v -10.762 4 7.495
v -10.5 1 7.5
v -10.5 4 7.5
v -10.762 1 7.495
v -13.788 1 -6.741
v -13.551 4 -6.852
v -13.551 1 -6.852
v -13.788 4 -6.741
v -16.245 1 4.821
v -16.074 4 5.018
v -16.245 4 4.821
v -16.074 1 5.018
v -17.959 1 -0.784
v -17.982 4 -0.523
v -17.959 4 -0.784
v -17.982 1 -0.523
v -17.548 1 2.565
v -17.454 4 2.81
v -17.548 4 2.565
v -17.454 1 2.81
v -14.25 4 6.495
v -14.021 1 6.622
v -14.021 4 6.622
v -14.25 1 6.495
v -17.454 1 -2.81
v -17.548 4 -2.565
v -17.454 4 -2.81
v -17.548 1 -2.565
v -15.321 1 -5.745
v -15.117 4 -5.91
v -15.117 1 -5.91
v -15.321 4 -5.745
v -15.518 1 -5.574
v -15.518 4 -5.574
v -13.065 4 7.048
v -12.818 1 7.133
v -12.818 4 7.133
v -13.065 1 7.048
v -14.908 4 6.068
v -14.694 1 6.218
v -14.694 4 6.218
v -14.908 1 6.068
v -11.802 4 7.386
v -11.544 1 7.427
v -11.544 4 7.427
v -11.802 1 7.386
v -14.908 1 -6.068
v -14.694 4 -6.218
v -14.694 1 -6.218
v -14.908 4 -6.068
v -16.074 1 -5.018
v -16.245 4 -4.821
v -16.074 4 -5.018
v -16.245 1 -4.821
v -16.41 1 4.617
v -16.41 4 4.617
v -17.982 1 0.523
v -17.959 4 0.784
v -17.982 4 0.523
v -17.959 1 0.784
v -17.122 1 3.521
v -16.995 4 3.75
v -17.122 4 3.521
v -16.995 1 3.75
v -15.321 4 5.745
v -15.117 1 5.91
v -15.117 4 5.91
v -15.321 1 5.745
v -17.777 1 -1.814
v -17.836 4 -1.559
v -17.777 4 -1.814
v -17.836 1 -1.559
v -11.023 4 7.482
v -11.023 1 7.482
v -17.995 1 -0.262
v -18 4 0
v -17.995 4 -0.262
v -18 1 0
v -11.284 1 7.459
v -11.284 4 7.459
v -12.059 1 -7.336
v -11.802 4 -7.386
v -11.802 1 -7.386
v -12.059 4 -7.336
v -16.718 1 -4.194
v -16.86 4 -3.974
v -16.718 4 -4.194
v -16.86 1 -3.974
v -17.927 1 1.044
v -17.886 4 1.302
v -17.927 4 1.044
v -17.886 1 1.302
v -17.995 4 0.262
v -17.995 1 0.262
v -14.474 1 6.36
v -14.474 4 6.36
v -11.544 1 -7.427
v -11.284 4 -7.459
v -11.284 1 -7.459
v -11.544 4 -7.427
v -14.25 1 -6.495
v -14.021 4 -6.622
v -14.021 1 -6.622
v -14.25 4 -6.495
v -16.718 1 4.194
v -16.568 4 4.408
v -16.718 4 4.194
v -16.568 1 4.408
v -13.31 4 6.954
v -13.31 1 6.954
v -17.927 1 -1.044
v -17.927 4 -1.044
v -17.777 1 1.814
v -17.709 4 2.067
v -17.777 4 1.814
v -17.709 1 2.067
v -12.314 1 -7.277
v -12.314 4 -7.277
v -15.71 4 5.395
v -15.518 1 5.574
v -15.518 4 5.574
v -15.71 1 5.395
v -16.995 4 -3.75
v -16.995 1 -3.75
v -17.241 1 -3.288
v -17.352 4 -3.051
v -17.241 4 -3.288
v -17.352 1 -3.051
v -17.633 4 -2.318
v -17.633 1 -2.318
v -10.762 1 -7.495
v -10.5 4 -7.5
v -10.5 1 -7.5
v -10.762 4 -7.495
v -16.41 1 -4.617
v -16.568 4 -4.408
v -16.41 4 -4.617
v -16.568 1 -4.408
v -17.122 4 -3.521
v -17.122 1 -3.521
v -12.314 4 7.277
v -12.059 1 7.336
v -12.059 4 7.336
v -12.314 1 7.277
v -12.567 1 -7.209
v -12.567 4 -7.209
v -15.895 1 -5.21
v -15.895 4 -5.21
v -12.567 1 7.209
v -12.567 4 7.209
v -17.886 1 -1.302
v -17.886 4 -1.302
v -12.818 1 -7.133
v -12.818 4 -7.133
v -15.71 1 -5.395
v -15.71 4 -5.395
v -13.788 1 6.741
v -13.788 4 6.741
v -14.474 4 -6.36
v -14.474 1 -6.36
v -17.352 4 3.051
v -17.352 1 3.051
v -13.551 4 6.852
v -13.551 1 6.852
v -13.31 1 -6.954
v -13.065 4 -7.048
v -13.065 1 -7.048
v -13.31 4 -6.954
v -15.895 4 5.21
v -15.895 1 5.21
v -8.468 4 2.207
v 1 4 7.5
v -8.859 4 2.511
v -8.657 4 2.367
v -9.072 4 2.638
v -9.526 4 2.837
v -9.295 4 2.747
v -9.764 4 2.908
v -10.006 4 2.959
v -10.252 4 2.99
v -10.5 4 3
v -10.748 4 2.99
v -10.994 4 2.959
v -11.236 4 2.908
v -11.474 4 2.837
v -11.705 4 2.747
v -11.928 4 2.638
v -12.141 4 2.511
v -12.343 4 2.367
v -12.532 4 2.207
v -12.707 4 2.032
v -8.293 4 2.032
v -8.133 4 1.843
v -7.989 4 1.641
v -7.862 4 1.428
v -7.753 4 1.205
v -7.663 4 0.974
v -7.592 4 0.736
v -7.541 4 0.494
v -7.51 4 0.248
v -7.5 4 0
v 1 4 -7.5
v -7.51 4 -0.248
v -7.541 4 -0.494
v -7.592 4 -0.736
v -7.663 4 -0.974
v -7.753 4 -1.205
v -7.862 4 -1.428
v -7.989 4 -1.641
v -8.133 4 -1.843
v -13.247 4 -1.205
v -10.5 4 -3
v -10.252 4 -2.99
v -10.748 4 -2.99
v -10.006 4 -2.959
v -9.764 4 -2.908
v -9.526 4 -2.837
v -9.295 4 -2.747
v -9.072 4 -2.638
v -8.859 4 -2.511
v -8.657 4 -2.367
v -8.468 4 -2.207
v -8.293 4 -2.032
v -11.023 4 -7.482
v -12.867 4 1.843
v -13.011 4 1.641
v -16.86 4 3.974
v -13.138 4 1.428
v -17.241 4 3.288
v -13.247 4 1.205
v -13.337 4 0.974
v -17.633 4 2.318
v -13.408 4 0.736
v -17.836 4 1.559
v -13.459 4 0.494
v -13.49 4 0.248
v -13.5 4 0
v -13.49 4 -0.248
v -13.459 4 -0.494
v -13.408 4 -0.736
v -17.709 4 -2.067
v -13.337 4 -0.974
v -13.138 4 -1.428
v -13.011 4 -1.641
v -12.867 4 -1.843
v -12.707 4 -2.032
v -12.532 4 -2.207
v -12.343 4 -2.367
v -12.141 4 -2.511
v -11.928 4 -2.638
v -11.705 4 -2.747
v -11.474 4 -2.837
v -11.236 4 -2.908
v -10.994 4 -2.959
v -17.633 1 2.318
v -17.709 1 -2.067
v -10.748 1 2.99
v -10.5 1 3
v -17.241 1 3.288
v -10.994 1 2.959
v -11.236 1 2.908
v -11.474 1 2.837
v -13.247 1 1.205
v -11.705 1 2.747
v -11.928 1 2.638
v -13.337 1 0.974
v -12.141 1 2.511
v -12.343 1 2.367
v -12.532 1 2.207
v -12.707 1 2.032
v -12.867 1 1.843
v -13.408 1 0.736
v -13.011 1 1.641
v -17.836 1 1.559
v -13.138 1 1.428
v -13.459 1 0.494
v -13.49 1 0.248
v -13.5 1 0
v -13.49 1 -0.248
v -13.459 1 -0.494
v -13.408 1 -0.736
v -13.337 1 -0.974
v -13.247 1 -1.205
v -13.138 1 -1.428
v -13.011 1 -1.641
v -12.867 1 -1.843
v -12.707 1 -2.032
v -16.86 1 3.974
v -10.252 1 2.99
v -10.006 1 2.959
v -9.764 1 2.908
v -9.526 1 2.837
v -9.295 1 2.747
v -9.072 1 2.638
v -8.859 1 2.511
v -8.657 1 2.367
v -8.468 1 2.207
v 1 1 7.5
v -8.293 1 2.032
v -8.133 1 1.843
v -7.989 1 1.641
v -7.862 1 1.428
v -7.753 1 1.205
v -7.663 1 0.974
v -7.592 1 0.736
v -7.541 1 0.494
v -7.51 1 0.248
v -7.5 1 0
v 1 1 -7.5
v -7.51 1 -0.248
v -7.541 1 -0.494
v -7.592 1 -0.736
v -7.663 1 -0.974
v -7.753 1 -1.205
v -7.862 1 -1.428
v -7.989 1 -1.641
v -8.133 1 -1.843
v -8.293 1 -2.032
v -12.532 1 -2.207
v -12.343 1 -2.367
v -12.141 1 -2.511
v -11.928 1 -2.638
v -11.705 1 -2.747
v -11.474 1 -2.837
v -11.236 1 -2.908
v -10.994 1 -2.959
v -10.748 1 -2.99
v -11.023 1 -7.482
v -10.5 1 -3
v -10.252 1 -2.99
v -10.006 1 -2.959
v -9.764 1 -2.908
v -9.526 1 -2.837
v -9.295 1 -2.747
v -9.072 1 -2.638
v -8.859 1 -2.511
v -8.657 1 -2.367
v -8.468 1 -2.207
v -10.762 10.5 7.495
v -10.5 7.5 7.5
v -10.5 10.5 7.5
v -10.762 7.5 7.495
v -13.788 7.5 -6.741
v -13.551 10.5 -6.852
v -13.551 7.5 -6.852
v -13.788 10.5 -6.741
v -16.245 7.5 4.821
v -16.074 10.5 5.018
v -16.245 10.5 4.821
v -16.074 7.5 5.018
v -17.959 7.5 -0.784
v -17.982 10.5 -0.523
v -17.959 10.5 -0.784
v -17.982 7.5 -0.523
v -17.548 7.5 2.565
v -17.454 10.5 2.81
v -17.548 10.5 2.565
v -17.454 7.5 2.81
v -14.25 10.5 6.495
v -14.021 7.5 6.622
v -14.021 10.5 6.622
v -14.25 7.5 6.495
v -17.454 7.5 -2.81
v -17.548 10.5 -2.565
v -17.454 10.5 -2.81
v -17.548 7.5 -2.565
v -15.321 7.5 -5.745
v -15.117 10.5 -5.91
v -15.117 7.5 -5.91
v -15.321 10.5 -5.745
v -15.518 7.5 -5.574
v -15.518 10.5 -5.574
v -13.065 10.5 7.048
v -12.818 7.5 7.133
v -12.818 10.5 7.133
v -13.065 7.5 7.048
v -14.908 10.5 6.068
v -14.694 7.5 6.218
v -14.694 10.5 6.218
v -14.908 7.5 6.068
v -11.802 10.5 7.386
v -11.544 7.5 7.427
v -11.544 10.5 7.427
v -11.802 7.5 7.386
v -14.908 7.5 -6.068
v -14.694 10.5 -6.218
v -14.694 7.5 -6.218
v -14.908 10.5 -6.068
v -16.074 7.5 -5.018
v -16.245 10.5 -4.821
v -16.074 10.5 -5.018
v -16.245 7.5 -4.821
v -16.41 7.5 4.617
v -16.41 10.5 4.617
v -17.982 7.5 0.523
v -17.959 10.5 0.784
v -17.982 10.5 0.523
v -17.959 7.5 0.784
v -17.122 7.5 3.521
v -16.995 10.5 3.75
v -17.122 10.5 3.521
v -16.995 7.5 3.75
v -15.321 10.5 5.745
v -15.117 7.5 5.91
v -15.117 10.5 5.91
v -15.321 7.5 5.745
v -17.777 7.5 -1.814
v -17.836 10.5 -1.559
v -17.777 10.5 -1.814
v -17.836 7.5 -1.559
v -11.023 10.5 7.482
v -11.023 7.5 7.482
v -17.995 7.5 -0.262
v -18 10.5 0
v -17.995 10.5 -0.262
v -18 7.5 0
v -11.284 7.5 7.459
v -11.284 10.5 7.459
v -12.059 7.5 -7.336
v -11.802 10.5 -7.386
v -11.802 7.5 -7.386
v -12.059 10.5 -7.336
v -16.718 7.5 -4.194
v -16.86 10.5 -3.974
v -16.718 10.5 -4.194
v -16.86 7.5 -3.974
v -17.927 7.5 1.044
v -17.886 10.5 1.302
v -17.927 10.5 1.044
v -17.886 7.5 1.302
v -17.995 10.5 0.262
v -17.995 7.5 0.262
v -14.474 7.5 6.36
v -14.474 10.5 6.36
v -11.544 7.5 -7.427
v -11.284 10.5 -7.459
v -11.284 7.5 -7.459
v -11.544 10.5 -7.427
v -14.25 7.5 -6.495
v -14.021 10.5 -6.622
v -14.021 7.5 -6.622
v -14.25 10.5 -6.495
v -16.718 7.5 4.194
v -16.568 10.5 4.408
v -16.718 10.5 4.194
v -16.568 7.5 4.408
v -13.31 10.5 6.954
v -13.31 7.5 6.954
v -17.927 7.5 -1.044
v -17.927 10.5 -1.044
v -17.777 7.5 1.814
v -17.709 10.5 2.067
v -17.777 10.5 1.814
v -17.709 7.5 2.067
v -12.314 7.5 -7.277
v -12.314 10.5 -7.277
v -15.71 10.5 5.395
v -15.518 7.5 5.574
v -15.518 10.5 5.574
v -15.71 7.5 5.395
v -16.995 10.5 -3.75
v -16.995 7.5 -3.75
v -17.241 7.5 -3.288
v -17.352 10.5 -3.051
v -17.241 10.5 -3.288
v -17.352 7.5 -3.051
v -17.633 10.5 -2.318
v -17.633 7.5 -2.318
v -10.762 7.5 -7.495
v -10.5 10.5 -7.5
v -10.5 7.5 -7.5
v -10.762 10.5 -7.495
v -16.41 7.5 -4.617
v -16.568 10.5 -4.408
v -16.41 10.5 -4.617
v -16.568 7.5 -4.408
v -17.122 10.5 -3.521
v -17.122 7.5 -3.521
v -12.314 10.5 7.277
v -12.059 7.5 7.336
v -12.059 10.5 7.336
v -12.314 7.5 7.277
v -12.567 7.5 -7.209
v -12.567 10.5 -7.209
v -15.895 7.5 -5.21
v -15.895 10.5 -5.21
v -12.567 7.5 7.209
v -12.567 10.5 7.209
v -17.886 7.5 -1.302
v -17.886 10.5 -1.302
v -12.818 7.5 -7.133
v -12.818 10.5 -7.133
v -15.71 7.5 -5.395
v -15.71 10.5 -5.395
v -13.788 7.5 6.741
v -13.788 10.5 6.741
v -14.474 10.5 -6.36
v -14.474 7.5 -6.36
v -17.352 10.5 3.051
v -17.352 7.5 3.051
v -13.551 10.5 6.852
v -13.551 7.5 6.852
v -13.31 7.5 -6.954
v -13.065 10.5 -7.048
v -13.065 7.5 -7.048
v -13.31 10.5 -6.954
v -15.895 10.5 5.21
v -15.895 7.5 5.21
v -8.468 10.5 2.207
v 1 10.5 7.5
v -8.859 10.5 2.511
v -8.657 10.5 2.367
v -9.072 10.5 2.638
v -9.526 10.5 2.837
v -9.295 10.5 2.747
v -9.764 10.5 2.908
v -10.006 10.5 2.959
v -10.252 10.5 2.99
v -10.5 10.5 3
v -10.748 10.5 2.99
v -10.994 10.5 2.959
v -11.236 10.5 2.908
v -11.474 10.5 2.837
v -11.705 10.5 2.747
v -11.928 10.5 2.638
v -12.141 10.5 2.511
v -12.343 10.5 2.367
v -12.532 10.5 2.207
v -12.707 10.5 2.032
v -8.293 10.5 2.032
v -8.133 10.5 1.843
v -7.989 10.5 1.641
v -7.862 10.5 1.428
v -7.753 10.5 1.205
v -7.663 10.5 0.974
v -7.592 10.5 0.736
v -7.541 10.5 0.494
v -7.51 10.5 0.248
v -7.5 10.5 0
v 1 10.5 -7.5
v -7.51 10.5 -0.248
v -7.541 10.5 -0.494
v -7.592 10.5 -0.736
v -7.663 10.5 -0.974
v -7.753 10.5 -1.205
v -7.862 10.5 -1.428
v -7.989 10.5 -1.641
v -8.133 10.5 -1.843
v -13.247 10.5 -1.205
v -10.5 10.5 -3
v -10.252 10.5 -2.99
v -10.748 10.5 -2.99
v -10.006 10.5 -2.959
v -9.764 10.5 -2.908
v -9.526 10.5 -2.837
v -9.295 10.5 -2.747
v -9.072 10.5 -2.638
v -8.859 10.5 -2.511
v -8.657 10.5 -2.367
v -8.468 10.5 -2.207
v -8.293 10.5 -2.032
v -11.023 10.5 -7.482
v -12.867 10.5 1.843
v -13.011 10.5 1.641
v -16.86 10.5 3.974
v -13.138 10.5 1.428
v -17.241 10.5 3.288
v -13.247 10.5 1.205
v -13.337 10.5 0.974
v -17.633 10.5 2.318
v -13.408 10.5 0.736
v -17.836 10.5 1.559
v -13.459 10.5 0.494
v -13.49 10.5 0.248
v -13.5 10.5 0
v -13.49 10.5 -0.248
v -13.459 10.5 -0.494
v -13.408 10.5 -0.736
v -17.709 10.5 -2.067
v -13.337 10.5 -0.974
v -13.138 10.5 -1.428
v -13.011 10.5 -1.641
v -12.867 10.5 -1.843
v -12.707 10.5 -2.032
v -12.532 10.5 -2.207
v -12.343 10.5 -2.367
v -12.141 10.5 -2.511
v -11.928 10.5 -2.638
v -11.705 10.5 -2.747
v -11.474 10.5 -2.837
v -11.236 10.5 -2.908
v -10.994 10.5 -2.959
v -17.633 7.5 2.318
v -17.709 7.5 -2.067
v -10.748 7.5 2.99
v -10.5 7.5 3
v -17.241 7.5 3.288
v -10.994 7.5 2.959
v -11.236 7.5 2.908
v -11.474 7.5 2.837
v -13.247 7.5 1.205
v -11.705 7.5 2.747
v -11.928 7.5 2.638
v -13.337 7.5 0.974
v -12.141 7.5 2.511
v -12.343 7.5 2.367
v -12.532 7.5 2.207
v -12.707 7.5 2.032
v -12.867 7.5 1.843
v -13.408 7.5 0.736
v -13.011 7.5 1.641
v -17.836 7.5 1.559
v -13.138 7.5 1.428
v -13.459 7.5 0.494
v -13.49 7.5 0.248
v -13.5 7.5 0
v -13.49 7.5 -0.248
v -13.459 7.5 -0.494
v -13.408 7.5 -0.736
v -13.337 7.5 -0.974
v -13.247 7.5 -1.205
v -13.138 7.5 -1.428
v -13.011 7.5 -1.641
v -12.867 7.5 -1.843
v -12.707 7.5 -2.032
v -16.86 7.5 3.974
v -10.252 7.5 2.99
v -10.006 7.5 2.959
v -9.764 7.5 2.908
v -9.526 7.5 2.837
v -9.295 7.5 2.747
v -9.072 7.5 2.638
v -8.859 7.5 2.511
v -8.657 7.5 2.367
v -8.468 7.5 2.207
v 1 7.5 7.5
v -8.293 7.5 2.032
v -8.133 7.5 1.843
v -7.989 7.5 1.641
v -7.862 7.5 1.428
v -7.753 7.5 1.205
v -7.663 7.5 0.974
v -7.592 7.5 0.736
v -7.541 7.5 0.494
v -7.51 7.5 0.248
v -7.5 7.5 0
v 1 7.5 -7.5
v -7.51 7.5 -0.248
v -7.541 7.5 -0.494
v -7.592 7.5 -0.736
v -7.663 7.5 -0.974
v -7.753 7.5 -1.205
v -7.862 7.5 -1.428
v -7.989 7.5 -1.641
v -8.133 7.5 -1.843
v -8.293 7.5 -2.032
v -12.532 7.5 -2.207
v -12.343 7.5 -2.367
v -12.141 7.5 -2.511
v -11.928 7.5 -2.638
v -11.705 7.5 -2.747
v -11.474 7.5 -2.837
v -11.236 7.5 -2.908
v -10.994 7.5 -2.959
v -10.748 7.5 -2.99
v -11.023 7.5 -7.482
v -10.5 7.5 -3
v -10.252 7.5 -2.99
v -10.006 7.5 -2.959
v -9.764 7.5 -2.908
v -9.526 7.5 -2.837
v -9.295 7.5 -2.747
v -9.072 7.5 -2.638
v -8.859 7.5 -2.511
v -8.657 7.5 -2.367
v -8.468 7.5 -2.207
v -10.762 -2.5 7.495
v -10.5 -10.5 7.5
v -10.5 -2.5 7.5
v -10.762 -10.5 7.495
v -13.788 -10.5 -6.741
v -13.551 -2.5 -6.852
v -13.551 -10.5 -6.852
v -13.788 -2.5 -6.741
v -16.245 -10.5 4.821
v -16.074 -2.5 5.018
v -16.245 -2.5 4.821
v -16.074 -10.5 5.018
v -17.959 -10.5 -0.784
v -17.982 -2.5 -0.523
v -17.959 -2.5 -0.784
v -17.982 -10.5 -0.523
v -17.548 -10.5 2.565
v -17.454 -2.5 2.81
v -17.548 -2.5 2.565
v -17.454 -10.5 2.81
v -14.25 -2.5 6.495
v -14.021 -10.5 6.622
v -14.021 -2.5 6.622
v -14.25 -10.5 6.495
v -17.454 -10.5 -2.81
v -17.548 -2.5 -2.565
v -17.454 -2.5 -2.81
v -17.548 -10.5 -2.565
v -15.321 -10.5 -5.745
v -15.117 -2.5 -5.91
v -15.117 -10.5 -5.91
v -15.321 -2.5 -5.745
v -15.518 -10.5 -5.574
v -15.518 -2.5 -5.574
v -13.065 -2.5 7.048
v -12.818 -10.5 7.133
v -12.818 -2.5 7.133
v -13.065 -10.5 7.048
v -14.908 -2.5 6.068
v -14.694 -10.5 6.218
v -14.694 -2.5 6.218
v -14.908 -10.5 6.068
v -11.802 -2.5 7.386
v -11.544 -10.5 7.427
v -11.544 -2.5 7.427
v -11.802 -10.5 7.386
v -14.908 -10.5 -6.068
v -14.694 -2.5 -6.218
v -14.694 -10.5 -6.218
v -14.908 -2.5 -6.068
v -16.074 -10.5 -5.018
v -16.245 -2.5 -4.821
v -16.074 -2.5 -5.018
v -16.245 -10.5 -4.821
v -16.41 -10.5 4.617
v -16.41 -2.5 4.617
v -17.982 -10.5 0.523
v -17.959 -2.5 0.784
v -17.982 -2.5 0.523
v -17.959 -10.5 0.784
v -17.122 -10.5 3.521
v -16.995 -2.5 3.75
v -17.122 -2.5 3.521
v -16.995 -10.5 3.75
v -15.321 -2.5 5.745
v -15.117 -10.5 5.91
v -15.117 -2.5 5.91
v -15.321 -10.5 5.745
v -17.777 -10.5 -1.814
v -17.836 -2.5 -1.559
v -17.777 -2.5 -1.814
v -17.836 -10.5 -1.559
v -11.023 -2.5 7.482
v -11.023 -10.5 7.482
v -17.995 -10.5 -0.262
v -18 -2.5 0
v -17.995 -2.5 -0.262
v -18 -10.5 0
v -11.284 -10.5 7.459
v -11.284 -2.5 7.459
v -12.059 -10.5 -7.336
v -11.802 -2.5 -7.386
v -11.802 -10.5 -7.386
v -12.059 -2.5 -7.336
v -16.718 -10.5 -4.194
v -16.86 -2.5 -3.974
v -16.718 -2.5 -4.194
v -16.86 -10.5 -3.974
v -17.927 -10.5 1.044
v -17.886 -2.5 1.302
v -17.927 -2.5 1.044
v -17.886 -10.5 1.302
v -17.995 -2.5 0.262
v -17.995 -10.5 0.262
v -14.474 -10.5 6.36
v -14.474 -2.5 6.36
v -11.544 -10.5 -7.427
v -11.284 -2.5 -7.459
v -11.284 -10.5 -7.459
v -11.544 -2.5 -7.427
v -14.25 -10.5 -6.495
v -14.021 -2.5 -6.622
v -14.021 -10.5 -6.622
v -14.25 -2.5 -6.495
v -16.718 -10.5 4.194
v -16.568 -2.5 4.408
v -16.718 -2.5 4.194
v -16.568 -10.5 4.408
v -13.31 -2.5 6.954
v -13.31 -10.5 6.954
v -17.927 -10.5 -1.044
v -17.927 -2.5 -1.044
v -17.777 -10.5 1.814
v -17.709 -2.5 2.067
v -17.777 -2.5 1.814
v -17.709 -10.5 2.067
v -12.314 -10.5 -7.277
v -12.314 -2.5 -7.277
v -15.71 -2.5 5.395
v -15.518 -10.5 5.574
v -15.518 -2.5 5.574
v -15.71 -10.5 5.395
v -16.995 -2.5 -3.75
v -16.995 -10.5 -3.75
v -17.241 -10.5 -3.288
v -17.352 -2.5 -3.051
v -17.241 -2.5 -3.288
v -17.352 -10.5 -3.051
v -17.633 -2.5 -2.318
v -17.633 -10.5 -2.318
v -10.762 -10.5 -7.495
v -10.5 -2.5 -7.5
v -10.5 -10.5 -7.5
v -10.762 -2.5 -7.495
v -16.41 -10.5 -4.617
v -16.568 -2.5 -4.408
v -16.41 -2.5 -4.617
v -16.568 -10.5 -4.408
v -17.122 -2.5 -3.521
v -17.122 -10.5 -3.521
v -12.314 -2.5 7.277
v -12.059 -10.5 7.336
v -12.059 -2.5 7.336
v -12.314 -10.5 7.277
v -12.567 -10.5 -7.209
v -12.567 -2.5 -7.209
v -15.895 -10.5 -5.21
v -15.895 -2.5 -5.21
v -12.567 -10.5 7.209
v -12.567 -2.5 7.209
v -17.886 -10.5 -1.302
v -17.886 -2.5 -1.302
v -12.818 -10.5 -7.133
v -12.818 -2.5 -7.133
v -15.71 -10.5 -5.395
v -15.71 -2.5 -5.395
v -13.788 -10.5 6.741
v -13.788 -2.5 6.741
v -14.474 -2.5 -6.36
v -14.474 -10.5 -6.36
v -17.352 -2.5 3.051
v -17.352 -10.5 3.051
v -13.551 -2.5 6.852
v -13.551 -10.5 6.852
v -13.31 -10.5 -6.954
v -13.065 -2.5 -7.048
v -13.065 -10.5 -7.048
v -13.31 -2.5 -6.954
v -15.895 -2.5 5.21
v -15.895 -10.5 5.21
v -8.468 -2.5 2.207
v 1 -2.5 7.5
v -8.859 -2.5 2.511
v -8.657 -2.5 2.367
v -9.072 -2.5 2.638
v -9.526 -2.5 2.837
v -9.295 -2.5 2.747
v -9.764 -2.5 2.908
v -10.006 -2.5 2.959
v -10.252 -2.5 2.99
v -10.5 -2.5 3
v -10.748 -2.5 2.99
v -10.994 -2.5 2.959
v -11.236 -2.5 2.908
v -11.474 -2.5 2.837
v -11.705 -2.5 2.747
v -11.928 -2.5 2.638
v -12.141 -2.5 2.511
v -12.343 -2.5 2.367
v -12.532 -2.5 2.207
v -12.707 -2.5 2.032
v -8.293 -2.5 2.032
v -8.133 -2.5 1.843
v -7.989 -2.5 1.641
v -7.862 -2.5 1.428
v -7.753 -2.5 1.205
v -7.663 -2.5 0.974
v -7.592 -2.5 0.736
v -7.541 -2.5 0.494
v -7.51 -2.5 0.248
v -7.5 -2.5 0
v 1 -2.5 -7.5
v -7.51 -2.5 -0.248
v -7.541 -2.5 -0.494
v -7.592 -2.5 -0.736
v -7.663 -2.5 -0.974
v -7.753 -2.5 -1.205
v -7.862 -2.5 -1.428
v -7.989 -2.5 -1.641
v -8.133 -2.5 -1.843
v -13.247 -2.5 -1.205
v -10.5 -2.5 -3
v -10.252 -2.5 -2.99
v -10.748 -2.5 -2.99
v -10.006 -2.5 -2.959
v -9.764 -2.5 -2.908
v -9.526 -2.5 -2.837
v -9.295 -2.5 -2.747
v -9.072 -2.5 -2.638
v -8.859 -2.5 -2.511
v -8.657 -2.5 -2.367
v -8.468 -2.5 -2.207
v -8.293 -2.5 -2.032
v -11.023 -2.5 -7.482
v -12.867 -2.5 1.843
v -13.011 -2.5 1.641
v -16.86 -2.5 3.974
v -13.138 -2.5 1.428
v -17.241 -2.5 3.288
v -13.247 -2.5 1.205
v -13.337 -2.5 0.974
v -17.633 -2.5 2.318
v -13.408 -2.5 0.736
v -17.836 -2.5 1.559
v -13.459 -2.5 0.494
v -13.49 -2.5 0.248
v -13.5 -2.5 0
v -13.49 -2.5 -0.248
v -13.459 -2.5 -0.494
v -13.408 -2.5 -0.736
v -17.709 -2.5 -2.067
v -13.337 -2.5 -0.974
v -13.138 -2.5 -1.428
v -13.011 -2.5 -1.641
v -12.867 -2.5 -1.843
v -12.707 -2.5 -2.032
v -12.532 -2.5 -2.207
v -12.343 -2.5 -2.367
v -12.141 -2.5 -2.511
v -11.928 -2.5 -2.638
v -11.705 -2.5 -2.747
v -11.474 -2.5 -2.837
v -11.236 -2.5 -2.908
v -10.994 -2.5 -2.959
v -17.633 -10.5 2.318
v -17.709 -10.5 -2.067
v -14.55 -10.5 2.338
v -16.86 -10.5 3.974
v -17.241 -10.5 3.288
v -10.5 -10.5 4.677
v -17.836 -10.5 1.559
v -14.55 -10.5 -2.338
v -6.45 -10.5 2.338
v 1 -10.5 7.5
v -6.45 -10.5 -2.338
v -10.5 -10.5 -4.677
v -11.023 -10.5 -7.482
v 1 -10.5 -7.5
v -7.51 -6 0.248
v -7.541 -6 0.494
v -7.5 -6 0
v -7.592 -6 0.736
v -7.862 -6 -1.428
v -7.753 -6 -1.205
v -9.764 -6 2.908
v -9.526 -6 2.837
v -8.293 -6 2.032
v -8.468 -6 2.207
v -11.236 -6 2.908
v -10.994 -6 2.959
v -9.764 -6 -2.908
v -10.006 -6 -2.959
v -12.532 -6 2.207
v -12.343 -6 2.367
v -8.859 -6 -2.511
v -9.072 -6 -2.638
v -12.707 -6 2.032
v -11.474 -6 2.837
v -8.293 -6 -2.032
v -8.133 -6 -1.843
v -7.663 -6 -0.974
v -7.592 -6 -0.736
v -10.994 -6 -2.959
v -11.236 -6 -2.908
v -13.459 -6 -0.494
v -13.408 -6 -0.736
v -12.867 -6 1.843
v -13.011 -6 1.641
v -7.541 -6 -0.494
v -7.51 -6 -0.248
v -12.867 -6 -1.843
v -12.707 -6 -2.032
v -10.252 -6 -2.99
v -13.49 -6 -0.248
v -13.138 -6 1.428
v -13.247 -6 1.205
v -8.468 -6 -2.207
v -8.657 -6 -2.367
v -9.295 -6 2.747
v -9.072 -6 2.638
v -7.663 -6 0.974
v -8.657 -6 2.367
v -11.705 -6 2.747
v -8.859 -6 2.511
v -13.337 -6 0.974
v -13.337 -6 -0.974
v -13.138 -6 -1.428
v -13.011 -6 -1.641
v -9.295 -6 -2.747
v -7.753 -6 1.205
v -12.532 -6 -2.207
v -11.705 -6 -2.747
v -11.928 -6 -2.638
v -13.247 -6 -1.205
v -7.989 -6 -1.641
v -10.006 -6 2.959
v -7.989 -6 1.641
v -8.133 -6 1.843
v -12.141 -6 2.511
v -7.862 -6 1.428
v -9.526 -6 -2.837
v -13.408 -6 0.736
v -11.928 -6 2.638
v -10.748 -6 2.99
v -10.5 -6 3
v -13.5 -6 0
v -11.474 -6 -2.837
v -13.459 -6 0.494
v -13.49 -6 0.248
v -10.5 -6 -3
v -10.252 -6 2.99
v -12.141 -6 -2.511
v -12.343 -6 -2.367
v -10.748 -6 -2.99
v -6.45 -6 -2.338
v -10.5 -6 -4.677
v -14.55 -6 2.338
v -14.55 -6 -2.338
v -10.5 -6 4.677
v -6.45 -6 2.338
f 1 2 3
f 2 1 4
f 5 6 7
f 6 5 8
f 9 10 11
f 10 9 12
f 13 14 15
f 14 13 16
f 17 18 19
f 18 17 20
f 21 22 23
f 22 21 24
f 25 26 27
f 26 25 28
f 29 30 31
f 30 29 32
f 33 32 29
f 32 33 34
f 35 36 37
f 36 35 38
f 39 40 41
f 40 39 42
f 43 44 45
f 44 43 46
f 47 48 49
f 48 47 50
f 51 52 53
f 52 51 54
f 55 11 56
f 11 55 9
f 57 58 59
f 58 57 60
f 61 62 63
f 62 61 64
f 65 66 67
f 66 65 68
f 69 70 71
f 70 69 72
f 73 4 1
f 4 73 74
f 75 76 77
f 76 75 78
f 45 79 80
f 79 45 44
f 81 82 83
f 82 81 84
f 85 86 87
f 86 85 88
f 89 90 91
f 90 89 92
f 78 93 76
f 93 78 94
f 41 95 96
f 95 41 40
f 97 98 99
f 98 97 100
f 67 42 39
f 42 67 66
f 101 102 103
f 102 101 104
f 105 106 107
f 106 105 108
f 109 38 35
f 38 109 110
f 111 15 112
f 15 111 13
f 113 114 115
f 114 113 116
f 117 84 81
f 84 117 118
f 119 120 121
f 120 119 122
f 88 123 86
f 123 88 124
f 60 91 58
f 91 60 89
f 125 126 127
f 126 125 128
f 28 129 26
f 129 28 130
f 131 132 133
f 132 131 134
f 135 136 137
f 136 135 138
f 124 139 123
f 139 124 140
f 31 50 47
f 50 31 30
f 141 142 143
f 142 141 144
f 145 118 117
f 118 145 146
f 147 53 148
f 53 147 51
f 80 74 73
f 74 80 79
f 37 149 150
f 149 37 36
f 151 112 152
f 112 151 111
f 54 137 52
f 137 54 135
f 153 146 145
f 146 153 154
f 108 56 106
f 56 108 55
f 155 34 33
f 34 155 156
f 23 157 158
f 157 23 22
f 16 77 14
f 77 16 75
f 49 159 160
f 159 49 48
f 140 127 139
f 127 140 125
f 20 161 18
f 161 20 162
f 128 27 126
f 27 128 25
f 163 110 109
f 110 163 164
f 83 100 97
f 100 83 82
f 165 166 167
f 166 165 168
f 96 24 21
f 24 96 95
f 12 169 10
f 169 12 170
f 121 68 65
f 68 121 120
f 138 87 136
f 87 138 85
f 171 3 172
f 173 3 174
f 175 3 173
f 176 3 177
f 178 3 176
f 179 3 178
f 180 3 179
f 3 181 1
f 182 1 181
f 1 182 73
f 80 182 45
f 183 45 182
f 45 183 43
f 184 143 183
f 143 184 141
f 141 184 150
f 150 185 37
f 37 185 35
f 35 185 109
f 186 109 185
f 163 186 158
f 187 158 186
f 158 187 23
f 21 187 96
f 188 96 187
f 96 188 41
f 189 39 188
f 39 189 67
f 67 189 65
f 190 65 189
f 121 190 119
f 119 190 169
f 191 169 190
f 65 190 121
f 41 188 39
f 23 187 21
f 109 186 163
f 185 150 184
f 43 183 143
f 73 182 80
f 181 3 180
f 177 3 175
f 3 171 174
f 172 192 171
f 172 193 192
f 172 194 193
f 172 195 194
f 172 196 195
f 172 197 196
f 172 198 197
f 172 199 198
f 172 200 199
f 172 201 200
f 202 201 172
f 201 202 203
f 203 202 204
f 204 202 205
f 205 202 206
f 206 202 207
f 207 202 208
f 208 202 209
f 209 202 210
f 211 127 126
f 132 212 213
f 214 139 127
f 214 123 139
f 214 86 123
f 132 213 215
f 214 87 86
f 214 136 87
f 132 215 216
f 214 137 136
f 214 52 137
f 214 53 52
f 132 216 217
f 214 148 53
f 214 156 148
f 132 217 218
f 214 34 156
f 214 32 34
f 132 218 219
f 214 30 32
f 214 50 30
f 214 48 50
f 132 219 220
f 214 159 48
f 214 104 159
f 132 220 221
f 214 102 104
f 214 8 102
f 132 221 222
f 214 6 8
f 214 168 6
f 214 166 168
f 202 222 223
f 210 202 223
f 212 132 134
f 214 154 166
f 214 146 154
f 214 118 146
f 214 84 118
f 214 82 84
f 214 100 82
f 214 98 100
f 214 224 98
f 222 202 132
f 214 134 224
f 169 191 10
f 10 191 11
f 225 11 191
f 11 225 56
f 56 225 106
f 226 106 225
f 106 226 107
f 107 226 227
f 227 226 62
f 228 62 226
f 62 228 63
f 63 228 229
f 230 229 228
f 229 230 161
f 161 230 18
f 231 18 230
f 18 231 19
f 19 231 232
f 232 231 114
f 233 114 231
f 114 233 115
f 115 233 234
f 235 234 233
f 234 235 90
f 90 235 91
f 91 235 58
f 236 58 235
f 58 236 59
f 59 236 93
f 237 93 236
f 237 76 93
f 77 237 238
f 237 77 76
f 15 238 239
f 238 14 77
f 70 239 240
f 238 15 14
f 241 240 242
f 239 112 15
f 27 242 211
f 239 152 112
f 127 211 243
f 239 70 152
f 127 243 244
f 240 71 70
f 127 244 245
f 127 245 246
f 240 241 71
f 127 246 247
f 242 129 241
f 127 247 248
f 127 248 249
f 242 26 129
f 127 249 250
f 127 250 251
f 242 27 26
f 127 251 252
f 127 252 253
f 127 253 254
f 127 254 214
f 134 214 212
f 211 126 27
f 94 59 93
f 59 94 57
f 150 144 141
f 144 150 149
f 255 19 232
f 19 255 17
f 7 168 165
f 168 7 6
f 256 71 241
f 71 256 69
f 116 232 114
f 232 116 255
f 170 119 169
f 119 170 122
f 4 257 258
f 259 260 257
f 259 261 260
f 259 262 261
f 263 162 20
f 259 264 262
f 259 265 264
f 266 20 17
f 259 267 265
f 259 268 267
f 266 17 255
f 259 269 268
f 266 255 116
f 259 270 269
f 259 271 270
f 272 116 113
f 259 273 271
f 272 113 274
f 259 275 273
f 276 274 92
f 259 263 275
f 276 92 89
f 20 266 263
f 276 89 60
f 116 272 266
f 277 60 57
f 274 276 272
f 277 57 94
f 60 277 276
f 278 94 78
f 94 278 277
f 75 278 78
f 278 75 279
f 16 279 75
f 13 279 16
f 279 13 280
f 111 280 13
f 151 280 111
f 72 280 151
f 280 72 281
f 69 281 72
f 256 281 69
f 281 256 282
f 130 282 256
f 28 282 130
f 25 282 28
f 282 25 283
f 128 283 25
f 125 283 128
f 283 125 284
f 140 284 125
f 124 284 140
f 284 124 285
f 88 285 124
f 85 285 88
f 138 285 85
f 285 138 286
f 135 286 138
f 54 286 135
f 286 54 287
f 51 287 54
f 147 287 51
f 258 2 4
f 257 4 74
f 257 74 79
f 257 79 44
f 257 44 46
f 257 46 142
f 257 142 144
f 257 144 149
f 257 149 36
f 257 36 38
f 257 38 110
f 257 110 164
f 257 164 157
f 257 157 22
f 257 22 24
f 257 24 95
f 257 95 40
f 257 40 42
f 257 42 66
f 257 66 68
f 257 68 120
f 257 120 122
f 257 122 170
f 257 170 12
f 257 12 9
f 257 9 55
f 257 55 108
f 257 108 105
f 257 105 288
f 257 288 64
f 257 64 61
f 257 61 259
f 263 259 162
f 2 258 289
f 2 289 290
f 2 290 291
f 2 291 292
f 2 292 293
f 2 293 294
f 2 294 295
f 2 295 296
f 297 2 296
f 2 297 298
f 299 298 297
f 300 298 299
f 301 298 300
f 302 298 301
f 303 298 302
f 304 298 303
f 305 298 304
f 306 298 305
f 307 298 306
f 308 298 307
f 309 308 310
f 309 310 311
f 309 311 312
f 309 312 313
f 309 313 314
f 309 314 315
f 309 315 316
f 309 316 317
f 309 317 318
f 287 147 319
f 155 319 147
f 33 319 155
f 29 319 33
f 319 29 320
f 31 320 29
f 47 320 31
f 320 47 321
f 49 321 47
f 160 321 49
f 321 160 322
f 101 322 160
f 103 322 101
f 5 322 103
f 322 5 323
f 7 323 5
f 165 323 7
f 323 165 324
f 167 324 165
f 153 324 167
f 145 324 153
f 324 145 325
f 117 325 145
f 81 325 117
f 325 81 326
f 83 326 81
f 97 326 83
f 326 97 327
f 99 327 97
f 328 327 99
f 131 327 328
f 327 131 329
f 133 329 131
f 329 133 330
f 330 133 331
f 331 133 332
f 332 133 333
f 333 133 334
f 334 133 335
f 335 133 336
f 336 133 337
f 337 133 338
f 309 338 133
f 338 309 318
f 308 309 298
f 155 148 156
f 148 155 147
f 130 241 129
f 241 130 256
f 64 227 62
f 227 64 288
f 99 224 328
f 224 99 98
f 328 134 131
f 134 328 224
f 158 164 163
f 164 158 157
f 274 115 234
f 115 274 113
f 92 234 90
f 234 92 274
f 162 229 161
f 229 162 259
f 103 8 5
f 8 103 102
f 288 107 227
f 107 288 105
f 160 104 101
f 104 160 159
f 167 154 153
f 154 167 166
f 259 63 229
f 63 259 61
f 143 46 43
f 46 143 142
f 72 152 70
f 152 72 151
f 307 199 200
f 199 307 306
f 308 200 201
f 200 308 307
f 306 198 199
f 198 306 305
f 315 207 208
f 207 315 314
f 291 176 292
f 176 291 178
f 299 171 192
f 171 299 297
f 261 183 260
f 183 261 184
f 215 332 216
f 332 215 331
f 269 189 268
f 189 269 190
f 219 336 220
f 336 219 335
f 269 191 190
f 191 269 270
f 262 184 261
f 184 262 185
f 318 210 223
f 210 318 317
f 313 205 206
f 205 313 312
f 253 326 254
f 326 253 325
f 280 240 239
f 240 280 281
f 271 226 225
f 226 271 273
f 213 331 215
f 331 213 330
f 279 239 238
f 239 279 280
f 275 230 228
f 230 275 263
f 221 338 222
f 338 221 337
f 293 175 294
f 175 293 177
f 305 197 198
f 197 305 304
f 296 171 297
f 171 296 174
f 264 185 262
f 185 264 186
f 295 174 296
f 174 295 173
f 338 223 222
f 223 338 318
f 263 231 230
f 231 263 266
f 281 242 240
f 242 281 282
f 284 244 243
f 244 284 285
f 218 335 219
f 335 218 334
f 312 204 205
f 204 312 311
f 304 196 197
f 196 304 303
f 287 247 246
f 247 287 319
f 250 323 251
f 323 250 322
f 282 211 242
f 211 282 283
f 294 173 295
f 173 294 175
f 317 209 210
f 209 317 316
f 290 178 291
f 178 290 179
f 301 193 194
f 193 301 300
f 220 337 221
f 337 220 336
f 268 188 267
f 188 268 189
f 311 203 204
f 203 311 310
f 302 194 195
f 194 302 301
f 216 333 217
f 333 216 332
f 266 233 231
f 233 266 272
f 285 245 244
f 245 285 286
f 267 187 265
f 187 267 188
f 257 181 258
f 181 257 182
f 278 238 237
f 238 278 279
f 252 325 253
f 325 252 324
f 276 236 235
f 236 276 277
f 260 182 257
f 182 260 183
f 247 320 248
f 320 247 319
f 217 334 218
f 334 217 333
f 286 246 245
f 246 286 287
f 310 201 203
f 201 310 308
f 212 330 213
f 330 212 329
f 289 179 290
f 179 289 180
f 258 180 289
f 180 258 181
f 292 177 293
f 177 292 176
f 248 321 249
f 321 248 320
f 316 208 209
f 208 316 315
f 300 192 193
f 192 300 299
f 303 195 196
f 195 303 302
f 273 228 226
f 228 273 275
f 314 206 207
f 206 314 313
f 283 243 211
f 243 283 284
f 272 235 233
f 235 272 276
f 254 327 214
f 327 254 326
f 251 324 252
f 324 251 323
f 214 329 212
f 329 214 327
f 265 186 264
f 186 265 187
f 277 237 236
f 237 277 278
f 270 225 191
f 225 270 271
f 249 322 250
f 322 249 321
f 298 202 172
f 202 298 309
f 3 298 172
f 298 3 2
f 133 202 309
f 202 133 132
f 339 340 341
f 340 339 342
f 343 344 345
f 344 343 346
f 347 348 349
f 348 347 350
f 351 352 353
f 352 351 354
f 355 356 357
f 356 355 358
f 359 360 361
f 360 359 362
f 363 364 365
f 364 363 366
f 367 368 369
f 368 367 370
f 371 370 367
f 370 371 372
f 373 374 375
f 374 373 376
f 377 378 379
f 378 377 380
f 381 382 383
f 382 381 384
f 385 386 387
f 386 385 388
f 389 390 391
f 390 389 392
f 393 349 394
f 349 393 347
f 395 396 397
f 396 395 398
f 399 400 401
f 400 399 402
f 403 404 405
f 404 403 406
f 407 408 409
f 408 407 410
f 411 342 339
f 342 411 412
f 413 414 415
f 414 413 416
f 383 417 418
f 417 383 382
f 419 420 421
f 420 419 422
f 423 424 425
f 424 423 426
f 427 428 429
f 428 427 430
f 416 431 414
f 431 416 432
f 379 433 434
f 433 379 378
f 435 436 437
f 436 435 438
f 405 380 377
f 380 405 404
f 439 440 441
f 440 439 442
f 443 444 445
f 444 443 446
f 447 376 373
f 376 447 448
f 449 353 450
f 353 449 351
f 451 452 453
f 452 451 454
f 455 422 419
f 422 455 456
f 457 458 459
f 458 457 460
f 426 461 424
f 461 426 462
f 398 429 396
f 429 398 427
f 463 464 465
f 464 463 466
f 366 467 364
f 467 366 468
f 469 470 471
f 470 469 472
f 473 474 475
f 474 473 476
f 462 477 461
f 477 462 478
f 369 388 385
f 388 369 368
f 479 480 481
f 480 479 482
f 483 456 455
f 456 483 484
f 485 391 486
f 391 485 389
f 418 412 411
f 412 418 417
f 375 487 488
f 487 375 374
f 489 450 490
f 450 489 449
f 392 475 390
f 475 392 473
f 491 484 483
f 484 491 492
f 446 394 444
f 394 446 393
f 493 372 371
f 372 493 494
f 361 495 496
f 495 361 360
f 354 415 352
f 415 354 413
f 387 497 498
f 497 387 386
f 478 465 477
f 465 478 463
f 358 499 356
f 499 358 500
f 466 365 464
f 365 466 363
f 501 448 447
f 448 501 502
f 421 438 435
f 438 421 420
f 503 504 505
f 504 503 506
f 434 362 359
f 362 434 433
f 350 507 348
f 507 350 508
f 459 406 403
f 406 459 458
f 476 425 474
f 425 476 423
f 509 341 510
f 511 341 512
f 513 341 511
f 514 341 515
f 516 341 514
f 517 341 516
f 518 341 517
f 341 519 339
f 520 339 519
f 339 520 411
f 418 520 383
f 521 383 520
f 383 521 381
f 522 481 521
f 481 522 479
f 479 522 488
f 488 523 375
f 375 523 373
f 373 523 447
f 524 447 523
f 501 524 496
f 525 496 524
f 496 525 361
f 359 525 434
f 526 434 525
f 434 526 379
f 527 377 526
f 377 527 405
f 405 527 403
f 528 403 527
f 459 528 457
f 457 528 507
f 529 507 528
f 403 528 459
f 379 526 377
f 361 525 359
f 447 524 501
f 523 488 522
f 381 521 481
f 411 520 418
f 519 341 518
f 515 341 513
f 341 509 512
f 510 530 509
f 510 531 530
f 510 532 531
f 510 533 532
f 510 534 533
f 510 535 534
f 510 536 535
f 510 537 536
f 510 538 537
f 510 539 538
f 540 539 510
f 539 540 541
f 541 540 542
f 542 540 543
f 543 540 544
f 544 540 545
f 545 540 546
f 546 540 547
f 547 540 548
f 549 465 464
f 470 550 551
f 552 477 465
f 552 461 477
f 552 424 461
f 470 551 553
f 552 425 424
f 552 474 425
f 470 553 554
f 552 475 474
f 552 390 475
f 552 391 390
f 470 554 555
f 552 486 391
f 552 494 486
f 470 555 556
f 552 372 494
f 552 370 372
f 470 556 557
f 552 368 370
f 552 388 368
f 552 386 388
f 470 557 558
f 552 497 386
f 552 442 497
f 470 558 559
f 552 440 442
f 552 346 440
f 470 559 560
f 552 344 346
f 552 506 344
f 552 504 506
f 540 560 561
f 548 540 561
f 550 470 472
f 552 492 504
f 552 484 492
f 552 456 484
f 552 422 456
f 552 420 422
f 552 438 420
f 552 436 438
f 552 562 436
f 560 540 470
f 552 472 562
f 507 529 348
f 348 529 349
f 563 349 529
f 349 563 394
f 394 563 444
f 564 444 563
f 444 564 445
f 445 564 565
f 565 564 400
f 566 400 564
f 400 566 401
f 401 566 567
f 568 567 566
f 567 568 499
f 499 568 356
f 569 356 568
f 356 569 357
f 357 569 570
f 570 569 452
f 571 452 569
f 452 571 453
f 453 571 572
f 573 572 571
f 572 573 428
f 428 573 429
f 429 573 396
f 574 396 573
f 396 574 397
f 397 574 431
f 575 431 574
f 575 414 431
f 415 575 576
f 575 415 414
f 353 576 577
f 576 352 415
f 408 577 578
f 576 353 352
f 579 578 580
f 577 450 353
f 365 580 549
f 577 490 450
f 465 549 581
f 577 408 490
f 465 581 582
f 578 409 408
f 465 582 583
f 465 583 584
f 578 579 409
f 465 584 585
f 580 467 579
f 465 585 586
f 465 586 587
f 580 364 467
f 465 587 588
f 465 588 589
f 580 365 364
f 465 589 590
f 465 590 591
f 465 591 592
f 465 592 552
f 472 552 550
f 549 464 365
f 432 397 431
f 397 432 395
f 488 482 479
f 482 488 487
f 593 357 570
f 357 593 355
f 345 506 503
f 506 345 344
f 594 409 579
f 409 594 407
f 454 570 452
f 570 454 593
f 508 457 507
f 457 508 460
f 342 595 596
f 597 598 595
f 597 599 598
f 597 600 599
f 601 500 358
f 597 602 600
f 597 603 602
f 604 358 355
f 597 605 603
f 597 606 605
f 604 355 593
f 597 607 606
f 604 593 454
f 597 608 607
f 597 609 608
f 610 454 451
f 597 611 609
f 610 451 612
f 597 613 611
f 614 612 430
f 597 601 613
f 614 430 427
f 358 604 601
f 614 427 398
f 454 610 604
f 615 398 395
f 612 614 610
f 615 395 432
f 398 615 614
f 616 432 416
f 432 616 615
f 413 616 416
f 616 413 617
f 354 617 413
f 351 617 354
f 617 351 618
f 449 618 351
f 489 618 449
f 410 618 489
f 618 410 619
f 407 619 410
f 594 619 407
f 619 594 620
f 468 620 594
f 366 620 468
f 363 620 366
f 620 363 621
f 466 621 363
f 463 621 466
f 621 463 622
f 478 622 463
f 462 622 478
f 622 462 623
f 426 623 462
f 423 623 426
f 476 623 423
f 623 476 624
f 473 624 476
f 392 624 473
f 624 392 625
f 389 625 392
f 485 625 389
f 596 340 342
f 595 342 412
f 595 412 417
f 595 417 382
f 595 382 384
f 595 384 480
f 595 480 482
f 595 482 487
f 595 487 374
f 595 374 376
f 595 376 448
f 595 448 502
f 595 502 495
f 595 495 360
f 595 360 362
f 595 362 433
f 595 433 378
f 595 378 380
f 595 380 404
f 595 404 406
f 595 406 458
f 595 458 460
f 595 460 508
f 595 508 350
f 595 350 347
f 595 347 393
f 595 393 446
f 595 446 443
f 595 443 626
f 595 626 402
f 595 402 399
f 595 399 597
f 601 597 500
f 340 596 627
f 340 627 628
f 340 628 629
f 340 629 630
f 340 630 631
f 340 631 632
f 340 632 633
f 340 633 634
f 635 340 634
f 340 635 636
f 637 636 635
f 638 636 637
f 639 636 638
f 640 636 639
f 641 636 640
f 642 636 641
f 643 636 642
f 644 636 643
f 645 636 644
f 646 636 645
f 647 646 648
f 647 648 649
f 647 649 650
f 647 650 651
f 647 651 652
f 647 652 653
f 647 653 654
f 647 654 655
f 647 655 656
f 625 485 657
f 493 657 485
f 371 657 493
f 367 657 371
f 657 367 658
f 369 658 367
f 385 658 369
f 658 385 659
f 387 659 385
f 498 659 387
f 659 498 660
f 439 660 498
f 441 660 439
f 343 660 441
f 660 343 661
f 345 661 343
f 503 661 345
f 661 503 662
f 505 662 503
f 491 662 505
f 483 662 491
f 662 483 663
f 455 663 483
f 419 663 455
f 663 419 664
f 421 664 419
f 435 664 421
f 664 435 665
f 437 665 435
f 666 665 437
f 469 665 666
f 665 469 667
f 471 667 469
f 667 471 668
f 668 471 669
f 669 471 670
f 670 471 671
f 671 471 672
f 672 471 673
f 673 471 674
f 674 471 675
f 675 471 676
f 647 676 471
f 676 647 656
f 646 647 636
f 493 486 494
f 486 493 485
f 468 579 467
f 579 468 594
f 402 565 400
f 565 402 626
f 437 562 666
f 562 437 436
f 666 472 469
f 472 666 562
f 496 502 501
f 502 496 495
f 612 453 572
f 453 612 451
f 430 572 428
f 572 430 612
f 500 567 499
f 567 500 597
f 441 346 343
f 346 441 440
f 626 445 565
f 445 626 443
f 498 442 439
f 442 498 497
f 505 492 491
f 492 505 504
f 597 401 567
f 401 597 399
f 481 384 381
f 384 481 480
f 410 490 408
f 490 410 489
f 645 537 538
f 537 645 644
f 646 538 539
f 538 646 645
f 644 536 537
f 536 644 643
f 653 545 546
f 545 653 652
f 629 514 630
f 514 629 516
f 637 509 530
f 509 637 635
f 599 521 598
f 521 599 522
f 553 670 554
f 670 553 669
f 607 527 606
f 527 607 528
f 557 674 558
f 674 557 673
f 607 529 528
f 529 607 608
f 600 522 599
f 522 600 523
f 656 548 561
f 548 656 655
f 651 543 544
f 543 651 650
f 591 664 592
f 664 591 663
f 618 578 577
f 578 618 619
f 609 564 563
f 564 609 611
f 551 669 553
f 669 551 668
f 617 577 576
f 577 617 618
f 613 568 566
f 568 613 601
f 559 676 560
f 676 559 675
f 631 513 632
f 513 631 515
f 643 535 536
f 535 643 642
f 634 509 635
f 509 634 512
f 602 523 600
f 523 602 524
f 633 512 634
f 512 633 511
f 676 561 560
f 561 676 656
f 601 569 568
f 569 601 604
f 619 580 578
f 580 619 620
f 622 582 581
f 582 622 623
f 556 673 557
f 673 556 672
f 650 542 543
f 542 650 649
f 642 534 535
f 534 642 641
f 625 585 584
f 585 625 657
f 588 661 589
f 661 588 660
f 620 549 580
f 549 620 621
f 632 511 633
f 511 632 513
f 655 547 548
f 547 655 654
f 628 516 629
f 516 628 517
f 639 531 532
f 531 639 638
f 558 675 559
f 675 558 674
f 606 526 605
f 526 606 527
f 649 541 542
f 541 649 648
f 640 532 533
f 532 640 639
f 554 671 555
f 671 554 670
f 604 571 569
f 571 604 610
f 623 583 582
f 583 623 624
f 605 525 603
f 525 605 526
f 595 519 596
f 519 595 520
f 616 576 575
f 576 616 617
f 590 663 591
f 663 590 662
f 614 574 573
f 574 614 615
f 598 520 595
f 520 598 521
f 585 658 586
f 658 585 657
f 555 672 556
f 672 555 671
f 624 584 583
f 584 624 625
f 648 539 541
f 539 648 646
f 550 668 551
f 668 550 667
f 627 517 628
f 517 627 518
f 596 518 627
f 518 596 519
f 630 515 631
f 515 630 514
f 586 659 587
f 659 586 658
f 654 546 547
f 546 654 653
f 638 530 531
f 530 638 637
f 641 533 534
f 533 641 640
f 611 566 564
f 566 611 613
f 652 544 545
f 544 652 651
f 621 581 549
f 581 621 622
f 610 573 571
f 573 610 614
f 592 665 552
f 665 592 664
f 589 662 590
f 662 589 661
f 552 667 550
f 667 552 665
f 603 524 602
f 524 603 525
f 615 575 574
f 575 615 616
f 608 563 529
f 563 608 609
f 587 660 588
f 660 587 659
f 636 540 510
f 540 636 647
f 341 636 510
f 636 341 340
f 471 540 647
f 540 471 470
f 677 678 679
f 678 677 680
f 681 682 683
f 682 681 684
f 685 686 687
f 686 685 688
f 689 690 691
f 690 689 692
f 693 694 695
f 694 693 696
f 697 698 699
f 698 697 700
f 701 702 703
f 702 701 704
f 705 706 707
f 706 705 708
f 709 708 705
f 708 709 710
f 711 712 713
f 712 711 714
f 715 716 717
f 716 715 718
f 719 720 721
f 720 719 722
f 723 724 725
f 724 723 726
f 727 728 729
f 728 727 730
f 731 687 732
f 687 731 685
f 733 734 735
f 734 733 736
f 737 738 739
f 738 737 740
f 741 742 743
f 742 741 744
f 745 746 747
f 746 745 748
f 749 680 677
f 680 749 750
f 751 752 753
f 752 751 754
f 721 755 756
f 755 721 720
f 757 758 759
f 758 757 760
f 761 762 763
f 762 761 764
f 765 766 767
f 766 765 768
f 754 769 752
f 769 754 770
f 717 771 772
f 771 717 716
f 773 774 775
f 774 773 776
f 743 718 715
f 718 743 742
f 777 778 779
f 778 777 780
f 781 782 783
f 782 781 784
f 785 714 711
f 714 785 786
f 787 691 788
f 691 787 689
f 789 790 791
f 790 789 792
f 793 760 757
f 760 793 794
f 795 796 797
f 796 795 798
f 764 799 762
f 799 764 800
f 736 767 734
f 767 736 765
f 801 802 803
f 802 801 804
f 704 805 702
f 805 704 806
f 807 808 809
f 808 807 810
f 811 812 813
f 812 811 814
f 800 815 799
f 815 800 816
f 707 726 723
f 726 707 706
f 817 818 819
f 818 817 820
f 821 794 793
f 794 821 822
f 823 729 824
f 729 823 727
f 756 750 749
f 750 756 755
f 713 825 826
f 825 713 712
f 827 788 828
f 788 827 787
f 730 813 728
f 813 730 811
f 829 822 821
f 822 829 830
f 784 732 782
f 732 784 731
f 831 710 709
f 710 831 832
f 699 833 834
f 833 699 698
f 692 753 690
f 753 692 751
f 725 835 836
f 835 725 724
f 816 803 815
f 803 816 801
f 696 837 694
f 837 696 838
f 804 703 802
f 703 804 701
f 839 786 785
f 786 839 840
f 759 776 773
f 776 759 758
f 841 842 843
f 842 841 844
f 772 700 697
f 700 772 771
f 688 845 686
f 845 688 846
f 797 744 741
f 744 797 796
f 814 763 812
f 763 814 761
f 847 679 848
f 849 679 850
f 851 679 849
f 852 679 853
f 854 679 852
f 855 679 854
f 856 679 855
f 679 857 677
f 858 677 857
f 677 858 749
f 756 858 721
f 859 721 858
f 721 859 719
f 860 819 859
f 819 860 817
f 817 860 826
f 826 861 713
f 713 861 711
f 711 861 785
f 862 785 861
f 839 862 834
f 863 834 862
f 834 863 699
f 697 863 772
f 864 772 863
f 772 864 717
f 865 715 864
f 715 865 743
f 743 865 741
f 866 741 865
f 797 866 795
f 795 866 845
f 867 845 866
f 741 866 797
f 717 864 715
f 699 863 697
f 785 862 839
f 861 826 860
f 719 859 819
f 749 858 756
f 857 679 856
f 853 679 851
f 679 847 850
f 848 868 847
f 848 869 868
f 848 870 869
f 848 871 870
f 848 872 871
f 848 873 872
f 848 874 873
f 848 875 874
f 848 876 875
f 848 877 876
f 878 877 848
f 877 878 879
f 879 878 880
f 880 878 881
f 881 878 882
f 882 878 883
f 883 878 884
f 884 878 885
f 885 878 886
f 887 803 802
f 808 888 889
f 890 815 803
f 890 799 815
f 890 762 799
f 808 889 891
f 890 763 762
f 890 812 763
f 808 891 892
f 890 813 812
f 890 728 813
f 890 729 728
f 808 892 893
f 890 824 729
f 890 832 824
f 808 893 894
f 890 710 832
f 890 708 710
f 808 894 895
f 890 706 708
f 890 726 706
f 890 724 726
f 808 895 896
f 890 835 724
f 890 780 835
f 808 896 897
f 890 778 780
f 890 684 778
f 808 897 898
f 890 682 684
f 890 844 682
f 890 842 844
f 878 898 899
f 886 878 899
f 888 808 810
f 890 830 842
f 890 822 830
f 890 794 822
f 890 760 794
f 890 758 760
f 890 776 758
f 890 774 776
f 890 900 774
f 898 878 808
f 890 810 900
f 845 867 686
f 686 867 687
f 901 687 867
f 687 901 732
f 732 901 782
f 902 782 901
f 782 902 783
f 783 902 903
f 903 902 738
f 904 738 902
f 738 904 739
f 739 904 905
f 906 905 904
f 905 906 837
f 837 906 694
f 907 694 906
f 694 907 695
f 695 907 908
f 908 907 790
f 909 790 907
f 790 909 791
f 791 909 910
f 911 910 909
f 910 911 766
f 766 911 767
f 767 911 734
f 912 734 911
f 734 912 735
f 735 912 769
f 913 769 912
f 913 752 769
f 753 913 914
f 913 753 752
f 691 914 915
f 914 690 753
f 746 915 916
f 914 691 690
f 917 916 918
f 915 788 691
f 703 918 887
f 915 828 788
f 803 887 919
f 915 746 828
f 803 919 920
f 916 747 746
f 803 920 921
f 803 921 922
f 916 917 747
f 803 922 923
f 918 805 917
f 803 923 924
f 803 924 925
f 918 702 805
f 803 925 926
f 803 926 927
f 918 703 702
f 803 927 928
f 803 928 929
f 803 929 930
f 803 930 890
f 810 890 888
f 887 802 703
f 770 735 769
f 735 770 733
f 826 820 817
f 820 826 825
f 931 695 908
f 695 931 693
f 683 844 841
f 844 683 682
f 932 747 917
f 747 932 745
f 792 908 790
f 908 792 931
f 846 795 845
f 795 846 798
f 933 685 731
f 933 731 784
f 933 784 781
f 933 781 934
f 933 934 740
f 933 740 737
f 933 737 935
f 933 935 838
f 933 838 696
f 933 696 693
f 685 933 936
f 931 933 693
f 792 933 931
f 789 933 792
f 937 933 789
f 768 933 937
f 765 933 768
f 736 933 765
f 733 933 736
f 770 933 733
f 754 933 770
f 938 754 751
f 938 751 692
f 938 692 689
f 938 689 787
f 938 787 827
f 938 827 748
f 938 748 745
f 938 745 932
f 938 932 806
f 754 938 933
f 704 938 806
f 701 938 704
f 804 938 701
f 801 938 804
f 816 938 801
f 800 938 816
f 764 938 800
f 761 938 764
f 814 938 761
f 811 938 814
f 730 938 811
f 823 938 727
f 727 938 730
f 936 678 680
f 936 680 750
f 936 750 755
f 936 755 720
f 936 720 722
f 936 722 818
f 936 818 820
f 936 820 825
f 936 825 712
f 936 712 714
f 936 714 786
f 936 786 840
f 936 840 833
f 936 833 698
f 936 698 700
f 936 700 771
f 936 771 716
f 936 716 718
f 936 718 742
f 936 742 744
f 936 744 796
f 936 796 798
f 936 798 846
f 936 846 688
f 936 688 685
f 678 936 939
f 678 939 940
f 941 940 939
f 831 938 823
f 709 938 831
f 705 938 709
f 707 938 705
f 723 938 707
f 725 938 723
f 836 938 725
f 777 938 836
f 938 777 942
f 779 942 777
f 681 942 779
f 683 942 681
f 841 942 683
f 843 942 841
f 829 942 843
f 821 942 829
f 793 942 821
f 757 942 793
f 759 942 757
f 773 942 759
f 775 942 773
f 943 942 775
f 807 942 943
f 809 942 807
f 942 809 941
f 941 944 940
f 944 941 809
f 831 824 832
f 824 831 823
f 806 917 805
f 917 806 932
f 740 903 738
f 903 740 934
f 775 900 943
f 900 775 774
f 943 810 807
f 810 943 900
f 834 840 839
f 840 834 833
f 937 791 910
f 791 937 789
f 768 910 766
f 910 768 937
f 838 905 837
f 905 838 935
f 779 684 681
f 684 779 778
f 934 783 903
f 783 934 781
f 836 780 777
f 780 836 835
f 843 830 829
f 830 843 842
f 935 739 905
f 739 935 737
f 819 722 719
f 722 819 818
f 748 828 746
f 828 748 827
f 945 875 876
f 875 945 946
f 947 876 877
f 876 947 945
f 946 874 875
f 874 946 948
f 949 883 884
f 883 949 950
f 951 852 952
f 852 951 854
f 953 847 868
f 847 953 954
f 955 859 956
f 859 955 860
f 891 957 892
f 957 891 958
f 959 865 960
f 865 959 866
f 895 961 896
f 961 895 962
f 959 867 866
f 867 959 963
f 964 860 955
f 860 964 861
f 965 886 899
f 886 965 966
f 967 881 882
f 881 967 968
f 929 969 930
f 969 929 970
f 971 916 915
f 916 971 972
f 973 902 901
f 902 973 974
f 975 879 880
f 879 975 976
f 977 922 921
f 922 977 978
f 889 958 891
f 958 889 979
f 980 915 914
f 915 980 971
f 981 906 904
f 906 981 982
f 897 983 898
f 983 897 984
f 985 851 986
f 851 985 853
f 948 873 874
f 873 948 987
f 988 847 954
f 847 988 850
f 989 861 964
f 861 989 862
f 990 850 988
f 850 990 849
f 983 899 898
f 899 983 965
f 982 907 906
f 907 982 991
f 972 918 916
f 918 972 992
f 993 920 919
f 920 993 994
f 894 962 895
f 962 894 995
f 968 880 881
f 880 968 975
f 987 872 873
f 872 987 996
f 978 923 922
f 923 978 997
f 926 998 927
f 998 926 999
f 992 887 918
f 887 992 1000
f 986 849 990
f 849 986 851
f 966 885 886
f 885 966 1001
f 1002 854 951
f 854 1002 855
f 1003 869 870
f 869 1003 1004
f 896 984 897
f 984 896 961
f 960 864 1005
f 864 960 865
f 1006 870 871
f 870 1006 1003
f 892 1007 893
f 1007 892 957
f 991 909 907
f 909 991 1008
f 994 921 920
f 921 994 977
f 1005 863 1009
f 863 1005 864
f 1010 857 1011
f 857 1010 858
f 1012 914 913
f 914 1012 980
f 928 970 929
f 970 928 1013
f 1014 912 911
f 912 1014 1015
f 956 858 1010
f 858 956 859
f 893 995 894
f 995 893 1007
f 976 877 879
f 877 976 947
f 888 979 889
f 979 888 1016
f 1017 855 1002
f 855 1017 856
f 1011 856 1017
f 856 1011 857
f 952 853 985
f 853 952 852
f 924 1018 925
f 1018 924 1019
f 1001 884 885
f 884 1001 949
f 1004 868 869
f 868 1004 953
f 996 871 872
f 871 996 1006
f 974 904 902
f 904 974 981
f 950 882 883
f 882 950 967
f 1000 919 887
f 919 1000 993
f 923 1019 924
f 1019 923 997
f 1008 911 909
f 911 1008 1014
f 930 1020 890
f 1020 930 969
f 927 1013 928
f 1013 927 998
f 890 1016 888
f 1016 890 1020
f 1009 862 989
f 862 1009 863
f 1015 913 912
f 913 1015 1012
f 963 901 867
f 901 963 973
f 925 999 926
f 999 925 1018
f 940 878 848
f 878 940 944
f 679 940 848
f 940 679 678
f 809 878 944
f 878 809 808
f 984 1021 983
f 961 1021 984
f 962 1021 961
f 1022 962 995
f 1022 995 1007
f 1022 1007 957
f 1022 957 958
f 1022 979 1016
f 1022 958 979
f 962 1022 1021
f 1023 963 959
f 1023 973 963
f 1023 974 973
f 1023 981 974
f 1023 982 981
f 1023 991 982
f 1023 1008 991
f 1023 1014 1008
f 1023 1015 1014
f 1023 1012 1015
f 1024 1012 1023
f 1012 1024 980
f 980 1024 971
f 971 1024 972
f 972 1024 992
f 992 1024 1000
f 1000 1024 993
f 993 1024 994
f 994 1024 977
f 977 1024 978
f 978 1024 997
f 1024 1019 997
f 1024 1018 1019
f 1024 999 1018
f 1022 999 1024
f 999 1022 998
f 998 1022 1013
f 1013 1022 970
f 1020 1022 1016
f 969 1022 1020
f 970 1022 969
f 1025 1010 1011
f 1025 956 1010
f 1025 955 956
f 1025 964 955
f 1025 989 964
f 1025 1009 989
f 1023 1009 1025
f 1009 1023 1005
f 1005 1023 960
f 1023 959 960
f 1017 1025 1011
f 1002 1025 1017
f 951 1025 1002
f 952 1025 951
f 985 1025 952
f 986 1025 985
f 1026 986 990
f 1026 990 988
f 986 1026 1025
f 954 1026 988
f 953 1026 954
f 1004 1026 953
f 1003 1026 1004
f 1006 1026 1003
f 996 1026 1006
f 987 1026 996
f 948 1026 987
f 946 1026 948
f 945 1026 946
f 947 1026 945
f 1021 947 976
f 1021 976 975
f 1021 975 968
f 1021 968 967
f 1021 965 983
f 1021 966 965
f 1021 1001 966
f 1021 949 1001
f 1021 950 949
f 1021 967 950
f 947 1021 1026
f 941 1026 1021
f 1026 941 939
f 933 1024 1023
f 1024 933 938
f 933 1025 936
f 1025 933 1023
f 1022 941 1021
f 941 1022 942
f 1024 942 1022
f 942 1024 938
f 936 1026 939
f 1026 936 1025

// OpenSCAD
// Крепление для подводного фонаря, фиксирующее его на тыльной стороне кисти
// Goodman handle (GoPro mount)
// vеrsion 1.0.0
//
// OpenSCAD model
// =============================================

$fa = 2;
$fs = 0.25;

widthMount = 8;     // ширина стоек крепления
heightMount = 4;    // высота стоек крепления

module rack(widthMount) {
	color("green")
    rotate([90, 0, 0])
	union()
	{
		translate([3.5, (-7.5), 0])
			cube([4 + heightMount, 15, widthMount]);


		translate([0, (-7.5), 0])
			cube([7.5 + heightMount, 4, widthMount]);

		translate([0, 3.5, 0])
			cube([7.5 + heightMount, 4, widthMount]);

		difference()
		{
			cylinder(h = widthMount, d = 15);

			color("red")
            translate([0, 0, (-1)])
				cylinder(h = widthMount + 2, d = 6);
		}
	}
}


module bolt_mount() {
	color("red")
    rotate([0, 90, 0])                  // доворот углубления для гайки (по оси Y)
	rotate([90, 0, 0])                  // углубления для гайки (по оси X)
		for(i = [0:(360 / 3):359])      // 3 куба
		{
			rotate([0, 0, i])
				cube([4.6765, 8.1, 5], center = true);  //4.6188 = S*tan(30градусов), S=8мм (ключ для гайки М5 )
		}
}

module thin_mounts() {
	union() {

		translate([0, 4, 0])
		rack(3);

		translate([0, 10.5, 0])
		rack(3);
	}
}

module thick_mount() {
	//union() {
		difference() {
			translate([0, (-2.5), 0])
				rack(8);
            
            translate([0, (-8.5), 0])
                bolt_mount();

		}
	//}
}



// --- СБОРКА ---
module mount_GoPro_build() {
	//rotate([90,0,0])
    translate([-10.5, 0, 0])
    union() {
        thin_mounts();
        thick_mount();
    }

}

mount_GoPro_build();

//rack(widthMount);
